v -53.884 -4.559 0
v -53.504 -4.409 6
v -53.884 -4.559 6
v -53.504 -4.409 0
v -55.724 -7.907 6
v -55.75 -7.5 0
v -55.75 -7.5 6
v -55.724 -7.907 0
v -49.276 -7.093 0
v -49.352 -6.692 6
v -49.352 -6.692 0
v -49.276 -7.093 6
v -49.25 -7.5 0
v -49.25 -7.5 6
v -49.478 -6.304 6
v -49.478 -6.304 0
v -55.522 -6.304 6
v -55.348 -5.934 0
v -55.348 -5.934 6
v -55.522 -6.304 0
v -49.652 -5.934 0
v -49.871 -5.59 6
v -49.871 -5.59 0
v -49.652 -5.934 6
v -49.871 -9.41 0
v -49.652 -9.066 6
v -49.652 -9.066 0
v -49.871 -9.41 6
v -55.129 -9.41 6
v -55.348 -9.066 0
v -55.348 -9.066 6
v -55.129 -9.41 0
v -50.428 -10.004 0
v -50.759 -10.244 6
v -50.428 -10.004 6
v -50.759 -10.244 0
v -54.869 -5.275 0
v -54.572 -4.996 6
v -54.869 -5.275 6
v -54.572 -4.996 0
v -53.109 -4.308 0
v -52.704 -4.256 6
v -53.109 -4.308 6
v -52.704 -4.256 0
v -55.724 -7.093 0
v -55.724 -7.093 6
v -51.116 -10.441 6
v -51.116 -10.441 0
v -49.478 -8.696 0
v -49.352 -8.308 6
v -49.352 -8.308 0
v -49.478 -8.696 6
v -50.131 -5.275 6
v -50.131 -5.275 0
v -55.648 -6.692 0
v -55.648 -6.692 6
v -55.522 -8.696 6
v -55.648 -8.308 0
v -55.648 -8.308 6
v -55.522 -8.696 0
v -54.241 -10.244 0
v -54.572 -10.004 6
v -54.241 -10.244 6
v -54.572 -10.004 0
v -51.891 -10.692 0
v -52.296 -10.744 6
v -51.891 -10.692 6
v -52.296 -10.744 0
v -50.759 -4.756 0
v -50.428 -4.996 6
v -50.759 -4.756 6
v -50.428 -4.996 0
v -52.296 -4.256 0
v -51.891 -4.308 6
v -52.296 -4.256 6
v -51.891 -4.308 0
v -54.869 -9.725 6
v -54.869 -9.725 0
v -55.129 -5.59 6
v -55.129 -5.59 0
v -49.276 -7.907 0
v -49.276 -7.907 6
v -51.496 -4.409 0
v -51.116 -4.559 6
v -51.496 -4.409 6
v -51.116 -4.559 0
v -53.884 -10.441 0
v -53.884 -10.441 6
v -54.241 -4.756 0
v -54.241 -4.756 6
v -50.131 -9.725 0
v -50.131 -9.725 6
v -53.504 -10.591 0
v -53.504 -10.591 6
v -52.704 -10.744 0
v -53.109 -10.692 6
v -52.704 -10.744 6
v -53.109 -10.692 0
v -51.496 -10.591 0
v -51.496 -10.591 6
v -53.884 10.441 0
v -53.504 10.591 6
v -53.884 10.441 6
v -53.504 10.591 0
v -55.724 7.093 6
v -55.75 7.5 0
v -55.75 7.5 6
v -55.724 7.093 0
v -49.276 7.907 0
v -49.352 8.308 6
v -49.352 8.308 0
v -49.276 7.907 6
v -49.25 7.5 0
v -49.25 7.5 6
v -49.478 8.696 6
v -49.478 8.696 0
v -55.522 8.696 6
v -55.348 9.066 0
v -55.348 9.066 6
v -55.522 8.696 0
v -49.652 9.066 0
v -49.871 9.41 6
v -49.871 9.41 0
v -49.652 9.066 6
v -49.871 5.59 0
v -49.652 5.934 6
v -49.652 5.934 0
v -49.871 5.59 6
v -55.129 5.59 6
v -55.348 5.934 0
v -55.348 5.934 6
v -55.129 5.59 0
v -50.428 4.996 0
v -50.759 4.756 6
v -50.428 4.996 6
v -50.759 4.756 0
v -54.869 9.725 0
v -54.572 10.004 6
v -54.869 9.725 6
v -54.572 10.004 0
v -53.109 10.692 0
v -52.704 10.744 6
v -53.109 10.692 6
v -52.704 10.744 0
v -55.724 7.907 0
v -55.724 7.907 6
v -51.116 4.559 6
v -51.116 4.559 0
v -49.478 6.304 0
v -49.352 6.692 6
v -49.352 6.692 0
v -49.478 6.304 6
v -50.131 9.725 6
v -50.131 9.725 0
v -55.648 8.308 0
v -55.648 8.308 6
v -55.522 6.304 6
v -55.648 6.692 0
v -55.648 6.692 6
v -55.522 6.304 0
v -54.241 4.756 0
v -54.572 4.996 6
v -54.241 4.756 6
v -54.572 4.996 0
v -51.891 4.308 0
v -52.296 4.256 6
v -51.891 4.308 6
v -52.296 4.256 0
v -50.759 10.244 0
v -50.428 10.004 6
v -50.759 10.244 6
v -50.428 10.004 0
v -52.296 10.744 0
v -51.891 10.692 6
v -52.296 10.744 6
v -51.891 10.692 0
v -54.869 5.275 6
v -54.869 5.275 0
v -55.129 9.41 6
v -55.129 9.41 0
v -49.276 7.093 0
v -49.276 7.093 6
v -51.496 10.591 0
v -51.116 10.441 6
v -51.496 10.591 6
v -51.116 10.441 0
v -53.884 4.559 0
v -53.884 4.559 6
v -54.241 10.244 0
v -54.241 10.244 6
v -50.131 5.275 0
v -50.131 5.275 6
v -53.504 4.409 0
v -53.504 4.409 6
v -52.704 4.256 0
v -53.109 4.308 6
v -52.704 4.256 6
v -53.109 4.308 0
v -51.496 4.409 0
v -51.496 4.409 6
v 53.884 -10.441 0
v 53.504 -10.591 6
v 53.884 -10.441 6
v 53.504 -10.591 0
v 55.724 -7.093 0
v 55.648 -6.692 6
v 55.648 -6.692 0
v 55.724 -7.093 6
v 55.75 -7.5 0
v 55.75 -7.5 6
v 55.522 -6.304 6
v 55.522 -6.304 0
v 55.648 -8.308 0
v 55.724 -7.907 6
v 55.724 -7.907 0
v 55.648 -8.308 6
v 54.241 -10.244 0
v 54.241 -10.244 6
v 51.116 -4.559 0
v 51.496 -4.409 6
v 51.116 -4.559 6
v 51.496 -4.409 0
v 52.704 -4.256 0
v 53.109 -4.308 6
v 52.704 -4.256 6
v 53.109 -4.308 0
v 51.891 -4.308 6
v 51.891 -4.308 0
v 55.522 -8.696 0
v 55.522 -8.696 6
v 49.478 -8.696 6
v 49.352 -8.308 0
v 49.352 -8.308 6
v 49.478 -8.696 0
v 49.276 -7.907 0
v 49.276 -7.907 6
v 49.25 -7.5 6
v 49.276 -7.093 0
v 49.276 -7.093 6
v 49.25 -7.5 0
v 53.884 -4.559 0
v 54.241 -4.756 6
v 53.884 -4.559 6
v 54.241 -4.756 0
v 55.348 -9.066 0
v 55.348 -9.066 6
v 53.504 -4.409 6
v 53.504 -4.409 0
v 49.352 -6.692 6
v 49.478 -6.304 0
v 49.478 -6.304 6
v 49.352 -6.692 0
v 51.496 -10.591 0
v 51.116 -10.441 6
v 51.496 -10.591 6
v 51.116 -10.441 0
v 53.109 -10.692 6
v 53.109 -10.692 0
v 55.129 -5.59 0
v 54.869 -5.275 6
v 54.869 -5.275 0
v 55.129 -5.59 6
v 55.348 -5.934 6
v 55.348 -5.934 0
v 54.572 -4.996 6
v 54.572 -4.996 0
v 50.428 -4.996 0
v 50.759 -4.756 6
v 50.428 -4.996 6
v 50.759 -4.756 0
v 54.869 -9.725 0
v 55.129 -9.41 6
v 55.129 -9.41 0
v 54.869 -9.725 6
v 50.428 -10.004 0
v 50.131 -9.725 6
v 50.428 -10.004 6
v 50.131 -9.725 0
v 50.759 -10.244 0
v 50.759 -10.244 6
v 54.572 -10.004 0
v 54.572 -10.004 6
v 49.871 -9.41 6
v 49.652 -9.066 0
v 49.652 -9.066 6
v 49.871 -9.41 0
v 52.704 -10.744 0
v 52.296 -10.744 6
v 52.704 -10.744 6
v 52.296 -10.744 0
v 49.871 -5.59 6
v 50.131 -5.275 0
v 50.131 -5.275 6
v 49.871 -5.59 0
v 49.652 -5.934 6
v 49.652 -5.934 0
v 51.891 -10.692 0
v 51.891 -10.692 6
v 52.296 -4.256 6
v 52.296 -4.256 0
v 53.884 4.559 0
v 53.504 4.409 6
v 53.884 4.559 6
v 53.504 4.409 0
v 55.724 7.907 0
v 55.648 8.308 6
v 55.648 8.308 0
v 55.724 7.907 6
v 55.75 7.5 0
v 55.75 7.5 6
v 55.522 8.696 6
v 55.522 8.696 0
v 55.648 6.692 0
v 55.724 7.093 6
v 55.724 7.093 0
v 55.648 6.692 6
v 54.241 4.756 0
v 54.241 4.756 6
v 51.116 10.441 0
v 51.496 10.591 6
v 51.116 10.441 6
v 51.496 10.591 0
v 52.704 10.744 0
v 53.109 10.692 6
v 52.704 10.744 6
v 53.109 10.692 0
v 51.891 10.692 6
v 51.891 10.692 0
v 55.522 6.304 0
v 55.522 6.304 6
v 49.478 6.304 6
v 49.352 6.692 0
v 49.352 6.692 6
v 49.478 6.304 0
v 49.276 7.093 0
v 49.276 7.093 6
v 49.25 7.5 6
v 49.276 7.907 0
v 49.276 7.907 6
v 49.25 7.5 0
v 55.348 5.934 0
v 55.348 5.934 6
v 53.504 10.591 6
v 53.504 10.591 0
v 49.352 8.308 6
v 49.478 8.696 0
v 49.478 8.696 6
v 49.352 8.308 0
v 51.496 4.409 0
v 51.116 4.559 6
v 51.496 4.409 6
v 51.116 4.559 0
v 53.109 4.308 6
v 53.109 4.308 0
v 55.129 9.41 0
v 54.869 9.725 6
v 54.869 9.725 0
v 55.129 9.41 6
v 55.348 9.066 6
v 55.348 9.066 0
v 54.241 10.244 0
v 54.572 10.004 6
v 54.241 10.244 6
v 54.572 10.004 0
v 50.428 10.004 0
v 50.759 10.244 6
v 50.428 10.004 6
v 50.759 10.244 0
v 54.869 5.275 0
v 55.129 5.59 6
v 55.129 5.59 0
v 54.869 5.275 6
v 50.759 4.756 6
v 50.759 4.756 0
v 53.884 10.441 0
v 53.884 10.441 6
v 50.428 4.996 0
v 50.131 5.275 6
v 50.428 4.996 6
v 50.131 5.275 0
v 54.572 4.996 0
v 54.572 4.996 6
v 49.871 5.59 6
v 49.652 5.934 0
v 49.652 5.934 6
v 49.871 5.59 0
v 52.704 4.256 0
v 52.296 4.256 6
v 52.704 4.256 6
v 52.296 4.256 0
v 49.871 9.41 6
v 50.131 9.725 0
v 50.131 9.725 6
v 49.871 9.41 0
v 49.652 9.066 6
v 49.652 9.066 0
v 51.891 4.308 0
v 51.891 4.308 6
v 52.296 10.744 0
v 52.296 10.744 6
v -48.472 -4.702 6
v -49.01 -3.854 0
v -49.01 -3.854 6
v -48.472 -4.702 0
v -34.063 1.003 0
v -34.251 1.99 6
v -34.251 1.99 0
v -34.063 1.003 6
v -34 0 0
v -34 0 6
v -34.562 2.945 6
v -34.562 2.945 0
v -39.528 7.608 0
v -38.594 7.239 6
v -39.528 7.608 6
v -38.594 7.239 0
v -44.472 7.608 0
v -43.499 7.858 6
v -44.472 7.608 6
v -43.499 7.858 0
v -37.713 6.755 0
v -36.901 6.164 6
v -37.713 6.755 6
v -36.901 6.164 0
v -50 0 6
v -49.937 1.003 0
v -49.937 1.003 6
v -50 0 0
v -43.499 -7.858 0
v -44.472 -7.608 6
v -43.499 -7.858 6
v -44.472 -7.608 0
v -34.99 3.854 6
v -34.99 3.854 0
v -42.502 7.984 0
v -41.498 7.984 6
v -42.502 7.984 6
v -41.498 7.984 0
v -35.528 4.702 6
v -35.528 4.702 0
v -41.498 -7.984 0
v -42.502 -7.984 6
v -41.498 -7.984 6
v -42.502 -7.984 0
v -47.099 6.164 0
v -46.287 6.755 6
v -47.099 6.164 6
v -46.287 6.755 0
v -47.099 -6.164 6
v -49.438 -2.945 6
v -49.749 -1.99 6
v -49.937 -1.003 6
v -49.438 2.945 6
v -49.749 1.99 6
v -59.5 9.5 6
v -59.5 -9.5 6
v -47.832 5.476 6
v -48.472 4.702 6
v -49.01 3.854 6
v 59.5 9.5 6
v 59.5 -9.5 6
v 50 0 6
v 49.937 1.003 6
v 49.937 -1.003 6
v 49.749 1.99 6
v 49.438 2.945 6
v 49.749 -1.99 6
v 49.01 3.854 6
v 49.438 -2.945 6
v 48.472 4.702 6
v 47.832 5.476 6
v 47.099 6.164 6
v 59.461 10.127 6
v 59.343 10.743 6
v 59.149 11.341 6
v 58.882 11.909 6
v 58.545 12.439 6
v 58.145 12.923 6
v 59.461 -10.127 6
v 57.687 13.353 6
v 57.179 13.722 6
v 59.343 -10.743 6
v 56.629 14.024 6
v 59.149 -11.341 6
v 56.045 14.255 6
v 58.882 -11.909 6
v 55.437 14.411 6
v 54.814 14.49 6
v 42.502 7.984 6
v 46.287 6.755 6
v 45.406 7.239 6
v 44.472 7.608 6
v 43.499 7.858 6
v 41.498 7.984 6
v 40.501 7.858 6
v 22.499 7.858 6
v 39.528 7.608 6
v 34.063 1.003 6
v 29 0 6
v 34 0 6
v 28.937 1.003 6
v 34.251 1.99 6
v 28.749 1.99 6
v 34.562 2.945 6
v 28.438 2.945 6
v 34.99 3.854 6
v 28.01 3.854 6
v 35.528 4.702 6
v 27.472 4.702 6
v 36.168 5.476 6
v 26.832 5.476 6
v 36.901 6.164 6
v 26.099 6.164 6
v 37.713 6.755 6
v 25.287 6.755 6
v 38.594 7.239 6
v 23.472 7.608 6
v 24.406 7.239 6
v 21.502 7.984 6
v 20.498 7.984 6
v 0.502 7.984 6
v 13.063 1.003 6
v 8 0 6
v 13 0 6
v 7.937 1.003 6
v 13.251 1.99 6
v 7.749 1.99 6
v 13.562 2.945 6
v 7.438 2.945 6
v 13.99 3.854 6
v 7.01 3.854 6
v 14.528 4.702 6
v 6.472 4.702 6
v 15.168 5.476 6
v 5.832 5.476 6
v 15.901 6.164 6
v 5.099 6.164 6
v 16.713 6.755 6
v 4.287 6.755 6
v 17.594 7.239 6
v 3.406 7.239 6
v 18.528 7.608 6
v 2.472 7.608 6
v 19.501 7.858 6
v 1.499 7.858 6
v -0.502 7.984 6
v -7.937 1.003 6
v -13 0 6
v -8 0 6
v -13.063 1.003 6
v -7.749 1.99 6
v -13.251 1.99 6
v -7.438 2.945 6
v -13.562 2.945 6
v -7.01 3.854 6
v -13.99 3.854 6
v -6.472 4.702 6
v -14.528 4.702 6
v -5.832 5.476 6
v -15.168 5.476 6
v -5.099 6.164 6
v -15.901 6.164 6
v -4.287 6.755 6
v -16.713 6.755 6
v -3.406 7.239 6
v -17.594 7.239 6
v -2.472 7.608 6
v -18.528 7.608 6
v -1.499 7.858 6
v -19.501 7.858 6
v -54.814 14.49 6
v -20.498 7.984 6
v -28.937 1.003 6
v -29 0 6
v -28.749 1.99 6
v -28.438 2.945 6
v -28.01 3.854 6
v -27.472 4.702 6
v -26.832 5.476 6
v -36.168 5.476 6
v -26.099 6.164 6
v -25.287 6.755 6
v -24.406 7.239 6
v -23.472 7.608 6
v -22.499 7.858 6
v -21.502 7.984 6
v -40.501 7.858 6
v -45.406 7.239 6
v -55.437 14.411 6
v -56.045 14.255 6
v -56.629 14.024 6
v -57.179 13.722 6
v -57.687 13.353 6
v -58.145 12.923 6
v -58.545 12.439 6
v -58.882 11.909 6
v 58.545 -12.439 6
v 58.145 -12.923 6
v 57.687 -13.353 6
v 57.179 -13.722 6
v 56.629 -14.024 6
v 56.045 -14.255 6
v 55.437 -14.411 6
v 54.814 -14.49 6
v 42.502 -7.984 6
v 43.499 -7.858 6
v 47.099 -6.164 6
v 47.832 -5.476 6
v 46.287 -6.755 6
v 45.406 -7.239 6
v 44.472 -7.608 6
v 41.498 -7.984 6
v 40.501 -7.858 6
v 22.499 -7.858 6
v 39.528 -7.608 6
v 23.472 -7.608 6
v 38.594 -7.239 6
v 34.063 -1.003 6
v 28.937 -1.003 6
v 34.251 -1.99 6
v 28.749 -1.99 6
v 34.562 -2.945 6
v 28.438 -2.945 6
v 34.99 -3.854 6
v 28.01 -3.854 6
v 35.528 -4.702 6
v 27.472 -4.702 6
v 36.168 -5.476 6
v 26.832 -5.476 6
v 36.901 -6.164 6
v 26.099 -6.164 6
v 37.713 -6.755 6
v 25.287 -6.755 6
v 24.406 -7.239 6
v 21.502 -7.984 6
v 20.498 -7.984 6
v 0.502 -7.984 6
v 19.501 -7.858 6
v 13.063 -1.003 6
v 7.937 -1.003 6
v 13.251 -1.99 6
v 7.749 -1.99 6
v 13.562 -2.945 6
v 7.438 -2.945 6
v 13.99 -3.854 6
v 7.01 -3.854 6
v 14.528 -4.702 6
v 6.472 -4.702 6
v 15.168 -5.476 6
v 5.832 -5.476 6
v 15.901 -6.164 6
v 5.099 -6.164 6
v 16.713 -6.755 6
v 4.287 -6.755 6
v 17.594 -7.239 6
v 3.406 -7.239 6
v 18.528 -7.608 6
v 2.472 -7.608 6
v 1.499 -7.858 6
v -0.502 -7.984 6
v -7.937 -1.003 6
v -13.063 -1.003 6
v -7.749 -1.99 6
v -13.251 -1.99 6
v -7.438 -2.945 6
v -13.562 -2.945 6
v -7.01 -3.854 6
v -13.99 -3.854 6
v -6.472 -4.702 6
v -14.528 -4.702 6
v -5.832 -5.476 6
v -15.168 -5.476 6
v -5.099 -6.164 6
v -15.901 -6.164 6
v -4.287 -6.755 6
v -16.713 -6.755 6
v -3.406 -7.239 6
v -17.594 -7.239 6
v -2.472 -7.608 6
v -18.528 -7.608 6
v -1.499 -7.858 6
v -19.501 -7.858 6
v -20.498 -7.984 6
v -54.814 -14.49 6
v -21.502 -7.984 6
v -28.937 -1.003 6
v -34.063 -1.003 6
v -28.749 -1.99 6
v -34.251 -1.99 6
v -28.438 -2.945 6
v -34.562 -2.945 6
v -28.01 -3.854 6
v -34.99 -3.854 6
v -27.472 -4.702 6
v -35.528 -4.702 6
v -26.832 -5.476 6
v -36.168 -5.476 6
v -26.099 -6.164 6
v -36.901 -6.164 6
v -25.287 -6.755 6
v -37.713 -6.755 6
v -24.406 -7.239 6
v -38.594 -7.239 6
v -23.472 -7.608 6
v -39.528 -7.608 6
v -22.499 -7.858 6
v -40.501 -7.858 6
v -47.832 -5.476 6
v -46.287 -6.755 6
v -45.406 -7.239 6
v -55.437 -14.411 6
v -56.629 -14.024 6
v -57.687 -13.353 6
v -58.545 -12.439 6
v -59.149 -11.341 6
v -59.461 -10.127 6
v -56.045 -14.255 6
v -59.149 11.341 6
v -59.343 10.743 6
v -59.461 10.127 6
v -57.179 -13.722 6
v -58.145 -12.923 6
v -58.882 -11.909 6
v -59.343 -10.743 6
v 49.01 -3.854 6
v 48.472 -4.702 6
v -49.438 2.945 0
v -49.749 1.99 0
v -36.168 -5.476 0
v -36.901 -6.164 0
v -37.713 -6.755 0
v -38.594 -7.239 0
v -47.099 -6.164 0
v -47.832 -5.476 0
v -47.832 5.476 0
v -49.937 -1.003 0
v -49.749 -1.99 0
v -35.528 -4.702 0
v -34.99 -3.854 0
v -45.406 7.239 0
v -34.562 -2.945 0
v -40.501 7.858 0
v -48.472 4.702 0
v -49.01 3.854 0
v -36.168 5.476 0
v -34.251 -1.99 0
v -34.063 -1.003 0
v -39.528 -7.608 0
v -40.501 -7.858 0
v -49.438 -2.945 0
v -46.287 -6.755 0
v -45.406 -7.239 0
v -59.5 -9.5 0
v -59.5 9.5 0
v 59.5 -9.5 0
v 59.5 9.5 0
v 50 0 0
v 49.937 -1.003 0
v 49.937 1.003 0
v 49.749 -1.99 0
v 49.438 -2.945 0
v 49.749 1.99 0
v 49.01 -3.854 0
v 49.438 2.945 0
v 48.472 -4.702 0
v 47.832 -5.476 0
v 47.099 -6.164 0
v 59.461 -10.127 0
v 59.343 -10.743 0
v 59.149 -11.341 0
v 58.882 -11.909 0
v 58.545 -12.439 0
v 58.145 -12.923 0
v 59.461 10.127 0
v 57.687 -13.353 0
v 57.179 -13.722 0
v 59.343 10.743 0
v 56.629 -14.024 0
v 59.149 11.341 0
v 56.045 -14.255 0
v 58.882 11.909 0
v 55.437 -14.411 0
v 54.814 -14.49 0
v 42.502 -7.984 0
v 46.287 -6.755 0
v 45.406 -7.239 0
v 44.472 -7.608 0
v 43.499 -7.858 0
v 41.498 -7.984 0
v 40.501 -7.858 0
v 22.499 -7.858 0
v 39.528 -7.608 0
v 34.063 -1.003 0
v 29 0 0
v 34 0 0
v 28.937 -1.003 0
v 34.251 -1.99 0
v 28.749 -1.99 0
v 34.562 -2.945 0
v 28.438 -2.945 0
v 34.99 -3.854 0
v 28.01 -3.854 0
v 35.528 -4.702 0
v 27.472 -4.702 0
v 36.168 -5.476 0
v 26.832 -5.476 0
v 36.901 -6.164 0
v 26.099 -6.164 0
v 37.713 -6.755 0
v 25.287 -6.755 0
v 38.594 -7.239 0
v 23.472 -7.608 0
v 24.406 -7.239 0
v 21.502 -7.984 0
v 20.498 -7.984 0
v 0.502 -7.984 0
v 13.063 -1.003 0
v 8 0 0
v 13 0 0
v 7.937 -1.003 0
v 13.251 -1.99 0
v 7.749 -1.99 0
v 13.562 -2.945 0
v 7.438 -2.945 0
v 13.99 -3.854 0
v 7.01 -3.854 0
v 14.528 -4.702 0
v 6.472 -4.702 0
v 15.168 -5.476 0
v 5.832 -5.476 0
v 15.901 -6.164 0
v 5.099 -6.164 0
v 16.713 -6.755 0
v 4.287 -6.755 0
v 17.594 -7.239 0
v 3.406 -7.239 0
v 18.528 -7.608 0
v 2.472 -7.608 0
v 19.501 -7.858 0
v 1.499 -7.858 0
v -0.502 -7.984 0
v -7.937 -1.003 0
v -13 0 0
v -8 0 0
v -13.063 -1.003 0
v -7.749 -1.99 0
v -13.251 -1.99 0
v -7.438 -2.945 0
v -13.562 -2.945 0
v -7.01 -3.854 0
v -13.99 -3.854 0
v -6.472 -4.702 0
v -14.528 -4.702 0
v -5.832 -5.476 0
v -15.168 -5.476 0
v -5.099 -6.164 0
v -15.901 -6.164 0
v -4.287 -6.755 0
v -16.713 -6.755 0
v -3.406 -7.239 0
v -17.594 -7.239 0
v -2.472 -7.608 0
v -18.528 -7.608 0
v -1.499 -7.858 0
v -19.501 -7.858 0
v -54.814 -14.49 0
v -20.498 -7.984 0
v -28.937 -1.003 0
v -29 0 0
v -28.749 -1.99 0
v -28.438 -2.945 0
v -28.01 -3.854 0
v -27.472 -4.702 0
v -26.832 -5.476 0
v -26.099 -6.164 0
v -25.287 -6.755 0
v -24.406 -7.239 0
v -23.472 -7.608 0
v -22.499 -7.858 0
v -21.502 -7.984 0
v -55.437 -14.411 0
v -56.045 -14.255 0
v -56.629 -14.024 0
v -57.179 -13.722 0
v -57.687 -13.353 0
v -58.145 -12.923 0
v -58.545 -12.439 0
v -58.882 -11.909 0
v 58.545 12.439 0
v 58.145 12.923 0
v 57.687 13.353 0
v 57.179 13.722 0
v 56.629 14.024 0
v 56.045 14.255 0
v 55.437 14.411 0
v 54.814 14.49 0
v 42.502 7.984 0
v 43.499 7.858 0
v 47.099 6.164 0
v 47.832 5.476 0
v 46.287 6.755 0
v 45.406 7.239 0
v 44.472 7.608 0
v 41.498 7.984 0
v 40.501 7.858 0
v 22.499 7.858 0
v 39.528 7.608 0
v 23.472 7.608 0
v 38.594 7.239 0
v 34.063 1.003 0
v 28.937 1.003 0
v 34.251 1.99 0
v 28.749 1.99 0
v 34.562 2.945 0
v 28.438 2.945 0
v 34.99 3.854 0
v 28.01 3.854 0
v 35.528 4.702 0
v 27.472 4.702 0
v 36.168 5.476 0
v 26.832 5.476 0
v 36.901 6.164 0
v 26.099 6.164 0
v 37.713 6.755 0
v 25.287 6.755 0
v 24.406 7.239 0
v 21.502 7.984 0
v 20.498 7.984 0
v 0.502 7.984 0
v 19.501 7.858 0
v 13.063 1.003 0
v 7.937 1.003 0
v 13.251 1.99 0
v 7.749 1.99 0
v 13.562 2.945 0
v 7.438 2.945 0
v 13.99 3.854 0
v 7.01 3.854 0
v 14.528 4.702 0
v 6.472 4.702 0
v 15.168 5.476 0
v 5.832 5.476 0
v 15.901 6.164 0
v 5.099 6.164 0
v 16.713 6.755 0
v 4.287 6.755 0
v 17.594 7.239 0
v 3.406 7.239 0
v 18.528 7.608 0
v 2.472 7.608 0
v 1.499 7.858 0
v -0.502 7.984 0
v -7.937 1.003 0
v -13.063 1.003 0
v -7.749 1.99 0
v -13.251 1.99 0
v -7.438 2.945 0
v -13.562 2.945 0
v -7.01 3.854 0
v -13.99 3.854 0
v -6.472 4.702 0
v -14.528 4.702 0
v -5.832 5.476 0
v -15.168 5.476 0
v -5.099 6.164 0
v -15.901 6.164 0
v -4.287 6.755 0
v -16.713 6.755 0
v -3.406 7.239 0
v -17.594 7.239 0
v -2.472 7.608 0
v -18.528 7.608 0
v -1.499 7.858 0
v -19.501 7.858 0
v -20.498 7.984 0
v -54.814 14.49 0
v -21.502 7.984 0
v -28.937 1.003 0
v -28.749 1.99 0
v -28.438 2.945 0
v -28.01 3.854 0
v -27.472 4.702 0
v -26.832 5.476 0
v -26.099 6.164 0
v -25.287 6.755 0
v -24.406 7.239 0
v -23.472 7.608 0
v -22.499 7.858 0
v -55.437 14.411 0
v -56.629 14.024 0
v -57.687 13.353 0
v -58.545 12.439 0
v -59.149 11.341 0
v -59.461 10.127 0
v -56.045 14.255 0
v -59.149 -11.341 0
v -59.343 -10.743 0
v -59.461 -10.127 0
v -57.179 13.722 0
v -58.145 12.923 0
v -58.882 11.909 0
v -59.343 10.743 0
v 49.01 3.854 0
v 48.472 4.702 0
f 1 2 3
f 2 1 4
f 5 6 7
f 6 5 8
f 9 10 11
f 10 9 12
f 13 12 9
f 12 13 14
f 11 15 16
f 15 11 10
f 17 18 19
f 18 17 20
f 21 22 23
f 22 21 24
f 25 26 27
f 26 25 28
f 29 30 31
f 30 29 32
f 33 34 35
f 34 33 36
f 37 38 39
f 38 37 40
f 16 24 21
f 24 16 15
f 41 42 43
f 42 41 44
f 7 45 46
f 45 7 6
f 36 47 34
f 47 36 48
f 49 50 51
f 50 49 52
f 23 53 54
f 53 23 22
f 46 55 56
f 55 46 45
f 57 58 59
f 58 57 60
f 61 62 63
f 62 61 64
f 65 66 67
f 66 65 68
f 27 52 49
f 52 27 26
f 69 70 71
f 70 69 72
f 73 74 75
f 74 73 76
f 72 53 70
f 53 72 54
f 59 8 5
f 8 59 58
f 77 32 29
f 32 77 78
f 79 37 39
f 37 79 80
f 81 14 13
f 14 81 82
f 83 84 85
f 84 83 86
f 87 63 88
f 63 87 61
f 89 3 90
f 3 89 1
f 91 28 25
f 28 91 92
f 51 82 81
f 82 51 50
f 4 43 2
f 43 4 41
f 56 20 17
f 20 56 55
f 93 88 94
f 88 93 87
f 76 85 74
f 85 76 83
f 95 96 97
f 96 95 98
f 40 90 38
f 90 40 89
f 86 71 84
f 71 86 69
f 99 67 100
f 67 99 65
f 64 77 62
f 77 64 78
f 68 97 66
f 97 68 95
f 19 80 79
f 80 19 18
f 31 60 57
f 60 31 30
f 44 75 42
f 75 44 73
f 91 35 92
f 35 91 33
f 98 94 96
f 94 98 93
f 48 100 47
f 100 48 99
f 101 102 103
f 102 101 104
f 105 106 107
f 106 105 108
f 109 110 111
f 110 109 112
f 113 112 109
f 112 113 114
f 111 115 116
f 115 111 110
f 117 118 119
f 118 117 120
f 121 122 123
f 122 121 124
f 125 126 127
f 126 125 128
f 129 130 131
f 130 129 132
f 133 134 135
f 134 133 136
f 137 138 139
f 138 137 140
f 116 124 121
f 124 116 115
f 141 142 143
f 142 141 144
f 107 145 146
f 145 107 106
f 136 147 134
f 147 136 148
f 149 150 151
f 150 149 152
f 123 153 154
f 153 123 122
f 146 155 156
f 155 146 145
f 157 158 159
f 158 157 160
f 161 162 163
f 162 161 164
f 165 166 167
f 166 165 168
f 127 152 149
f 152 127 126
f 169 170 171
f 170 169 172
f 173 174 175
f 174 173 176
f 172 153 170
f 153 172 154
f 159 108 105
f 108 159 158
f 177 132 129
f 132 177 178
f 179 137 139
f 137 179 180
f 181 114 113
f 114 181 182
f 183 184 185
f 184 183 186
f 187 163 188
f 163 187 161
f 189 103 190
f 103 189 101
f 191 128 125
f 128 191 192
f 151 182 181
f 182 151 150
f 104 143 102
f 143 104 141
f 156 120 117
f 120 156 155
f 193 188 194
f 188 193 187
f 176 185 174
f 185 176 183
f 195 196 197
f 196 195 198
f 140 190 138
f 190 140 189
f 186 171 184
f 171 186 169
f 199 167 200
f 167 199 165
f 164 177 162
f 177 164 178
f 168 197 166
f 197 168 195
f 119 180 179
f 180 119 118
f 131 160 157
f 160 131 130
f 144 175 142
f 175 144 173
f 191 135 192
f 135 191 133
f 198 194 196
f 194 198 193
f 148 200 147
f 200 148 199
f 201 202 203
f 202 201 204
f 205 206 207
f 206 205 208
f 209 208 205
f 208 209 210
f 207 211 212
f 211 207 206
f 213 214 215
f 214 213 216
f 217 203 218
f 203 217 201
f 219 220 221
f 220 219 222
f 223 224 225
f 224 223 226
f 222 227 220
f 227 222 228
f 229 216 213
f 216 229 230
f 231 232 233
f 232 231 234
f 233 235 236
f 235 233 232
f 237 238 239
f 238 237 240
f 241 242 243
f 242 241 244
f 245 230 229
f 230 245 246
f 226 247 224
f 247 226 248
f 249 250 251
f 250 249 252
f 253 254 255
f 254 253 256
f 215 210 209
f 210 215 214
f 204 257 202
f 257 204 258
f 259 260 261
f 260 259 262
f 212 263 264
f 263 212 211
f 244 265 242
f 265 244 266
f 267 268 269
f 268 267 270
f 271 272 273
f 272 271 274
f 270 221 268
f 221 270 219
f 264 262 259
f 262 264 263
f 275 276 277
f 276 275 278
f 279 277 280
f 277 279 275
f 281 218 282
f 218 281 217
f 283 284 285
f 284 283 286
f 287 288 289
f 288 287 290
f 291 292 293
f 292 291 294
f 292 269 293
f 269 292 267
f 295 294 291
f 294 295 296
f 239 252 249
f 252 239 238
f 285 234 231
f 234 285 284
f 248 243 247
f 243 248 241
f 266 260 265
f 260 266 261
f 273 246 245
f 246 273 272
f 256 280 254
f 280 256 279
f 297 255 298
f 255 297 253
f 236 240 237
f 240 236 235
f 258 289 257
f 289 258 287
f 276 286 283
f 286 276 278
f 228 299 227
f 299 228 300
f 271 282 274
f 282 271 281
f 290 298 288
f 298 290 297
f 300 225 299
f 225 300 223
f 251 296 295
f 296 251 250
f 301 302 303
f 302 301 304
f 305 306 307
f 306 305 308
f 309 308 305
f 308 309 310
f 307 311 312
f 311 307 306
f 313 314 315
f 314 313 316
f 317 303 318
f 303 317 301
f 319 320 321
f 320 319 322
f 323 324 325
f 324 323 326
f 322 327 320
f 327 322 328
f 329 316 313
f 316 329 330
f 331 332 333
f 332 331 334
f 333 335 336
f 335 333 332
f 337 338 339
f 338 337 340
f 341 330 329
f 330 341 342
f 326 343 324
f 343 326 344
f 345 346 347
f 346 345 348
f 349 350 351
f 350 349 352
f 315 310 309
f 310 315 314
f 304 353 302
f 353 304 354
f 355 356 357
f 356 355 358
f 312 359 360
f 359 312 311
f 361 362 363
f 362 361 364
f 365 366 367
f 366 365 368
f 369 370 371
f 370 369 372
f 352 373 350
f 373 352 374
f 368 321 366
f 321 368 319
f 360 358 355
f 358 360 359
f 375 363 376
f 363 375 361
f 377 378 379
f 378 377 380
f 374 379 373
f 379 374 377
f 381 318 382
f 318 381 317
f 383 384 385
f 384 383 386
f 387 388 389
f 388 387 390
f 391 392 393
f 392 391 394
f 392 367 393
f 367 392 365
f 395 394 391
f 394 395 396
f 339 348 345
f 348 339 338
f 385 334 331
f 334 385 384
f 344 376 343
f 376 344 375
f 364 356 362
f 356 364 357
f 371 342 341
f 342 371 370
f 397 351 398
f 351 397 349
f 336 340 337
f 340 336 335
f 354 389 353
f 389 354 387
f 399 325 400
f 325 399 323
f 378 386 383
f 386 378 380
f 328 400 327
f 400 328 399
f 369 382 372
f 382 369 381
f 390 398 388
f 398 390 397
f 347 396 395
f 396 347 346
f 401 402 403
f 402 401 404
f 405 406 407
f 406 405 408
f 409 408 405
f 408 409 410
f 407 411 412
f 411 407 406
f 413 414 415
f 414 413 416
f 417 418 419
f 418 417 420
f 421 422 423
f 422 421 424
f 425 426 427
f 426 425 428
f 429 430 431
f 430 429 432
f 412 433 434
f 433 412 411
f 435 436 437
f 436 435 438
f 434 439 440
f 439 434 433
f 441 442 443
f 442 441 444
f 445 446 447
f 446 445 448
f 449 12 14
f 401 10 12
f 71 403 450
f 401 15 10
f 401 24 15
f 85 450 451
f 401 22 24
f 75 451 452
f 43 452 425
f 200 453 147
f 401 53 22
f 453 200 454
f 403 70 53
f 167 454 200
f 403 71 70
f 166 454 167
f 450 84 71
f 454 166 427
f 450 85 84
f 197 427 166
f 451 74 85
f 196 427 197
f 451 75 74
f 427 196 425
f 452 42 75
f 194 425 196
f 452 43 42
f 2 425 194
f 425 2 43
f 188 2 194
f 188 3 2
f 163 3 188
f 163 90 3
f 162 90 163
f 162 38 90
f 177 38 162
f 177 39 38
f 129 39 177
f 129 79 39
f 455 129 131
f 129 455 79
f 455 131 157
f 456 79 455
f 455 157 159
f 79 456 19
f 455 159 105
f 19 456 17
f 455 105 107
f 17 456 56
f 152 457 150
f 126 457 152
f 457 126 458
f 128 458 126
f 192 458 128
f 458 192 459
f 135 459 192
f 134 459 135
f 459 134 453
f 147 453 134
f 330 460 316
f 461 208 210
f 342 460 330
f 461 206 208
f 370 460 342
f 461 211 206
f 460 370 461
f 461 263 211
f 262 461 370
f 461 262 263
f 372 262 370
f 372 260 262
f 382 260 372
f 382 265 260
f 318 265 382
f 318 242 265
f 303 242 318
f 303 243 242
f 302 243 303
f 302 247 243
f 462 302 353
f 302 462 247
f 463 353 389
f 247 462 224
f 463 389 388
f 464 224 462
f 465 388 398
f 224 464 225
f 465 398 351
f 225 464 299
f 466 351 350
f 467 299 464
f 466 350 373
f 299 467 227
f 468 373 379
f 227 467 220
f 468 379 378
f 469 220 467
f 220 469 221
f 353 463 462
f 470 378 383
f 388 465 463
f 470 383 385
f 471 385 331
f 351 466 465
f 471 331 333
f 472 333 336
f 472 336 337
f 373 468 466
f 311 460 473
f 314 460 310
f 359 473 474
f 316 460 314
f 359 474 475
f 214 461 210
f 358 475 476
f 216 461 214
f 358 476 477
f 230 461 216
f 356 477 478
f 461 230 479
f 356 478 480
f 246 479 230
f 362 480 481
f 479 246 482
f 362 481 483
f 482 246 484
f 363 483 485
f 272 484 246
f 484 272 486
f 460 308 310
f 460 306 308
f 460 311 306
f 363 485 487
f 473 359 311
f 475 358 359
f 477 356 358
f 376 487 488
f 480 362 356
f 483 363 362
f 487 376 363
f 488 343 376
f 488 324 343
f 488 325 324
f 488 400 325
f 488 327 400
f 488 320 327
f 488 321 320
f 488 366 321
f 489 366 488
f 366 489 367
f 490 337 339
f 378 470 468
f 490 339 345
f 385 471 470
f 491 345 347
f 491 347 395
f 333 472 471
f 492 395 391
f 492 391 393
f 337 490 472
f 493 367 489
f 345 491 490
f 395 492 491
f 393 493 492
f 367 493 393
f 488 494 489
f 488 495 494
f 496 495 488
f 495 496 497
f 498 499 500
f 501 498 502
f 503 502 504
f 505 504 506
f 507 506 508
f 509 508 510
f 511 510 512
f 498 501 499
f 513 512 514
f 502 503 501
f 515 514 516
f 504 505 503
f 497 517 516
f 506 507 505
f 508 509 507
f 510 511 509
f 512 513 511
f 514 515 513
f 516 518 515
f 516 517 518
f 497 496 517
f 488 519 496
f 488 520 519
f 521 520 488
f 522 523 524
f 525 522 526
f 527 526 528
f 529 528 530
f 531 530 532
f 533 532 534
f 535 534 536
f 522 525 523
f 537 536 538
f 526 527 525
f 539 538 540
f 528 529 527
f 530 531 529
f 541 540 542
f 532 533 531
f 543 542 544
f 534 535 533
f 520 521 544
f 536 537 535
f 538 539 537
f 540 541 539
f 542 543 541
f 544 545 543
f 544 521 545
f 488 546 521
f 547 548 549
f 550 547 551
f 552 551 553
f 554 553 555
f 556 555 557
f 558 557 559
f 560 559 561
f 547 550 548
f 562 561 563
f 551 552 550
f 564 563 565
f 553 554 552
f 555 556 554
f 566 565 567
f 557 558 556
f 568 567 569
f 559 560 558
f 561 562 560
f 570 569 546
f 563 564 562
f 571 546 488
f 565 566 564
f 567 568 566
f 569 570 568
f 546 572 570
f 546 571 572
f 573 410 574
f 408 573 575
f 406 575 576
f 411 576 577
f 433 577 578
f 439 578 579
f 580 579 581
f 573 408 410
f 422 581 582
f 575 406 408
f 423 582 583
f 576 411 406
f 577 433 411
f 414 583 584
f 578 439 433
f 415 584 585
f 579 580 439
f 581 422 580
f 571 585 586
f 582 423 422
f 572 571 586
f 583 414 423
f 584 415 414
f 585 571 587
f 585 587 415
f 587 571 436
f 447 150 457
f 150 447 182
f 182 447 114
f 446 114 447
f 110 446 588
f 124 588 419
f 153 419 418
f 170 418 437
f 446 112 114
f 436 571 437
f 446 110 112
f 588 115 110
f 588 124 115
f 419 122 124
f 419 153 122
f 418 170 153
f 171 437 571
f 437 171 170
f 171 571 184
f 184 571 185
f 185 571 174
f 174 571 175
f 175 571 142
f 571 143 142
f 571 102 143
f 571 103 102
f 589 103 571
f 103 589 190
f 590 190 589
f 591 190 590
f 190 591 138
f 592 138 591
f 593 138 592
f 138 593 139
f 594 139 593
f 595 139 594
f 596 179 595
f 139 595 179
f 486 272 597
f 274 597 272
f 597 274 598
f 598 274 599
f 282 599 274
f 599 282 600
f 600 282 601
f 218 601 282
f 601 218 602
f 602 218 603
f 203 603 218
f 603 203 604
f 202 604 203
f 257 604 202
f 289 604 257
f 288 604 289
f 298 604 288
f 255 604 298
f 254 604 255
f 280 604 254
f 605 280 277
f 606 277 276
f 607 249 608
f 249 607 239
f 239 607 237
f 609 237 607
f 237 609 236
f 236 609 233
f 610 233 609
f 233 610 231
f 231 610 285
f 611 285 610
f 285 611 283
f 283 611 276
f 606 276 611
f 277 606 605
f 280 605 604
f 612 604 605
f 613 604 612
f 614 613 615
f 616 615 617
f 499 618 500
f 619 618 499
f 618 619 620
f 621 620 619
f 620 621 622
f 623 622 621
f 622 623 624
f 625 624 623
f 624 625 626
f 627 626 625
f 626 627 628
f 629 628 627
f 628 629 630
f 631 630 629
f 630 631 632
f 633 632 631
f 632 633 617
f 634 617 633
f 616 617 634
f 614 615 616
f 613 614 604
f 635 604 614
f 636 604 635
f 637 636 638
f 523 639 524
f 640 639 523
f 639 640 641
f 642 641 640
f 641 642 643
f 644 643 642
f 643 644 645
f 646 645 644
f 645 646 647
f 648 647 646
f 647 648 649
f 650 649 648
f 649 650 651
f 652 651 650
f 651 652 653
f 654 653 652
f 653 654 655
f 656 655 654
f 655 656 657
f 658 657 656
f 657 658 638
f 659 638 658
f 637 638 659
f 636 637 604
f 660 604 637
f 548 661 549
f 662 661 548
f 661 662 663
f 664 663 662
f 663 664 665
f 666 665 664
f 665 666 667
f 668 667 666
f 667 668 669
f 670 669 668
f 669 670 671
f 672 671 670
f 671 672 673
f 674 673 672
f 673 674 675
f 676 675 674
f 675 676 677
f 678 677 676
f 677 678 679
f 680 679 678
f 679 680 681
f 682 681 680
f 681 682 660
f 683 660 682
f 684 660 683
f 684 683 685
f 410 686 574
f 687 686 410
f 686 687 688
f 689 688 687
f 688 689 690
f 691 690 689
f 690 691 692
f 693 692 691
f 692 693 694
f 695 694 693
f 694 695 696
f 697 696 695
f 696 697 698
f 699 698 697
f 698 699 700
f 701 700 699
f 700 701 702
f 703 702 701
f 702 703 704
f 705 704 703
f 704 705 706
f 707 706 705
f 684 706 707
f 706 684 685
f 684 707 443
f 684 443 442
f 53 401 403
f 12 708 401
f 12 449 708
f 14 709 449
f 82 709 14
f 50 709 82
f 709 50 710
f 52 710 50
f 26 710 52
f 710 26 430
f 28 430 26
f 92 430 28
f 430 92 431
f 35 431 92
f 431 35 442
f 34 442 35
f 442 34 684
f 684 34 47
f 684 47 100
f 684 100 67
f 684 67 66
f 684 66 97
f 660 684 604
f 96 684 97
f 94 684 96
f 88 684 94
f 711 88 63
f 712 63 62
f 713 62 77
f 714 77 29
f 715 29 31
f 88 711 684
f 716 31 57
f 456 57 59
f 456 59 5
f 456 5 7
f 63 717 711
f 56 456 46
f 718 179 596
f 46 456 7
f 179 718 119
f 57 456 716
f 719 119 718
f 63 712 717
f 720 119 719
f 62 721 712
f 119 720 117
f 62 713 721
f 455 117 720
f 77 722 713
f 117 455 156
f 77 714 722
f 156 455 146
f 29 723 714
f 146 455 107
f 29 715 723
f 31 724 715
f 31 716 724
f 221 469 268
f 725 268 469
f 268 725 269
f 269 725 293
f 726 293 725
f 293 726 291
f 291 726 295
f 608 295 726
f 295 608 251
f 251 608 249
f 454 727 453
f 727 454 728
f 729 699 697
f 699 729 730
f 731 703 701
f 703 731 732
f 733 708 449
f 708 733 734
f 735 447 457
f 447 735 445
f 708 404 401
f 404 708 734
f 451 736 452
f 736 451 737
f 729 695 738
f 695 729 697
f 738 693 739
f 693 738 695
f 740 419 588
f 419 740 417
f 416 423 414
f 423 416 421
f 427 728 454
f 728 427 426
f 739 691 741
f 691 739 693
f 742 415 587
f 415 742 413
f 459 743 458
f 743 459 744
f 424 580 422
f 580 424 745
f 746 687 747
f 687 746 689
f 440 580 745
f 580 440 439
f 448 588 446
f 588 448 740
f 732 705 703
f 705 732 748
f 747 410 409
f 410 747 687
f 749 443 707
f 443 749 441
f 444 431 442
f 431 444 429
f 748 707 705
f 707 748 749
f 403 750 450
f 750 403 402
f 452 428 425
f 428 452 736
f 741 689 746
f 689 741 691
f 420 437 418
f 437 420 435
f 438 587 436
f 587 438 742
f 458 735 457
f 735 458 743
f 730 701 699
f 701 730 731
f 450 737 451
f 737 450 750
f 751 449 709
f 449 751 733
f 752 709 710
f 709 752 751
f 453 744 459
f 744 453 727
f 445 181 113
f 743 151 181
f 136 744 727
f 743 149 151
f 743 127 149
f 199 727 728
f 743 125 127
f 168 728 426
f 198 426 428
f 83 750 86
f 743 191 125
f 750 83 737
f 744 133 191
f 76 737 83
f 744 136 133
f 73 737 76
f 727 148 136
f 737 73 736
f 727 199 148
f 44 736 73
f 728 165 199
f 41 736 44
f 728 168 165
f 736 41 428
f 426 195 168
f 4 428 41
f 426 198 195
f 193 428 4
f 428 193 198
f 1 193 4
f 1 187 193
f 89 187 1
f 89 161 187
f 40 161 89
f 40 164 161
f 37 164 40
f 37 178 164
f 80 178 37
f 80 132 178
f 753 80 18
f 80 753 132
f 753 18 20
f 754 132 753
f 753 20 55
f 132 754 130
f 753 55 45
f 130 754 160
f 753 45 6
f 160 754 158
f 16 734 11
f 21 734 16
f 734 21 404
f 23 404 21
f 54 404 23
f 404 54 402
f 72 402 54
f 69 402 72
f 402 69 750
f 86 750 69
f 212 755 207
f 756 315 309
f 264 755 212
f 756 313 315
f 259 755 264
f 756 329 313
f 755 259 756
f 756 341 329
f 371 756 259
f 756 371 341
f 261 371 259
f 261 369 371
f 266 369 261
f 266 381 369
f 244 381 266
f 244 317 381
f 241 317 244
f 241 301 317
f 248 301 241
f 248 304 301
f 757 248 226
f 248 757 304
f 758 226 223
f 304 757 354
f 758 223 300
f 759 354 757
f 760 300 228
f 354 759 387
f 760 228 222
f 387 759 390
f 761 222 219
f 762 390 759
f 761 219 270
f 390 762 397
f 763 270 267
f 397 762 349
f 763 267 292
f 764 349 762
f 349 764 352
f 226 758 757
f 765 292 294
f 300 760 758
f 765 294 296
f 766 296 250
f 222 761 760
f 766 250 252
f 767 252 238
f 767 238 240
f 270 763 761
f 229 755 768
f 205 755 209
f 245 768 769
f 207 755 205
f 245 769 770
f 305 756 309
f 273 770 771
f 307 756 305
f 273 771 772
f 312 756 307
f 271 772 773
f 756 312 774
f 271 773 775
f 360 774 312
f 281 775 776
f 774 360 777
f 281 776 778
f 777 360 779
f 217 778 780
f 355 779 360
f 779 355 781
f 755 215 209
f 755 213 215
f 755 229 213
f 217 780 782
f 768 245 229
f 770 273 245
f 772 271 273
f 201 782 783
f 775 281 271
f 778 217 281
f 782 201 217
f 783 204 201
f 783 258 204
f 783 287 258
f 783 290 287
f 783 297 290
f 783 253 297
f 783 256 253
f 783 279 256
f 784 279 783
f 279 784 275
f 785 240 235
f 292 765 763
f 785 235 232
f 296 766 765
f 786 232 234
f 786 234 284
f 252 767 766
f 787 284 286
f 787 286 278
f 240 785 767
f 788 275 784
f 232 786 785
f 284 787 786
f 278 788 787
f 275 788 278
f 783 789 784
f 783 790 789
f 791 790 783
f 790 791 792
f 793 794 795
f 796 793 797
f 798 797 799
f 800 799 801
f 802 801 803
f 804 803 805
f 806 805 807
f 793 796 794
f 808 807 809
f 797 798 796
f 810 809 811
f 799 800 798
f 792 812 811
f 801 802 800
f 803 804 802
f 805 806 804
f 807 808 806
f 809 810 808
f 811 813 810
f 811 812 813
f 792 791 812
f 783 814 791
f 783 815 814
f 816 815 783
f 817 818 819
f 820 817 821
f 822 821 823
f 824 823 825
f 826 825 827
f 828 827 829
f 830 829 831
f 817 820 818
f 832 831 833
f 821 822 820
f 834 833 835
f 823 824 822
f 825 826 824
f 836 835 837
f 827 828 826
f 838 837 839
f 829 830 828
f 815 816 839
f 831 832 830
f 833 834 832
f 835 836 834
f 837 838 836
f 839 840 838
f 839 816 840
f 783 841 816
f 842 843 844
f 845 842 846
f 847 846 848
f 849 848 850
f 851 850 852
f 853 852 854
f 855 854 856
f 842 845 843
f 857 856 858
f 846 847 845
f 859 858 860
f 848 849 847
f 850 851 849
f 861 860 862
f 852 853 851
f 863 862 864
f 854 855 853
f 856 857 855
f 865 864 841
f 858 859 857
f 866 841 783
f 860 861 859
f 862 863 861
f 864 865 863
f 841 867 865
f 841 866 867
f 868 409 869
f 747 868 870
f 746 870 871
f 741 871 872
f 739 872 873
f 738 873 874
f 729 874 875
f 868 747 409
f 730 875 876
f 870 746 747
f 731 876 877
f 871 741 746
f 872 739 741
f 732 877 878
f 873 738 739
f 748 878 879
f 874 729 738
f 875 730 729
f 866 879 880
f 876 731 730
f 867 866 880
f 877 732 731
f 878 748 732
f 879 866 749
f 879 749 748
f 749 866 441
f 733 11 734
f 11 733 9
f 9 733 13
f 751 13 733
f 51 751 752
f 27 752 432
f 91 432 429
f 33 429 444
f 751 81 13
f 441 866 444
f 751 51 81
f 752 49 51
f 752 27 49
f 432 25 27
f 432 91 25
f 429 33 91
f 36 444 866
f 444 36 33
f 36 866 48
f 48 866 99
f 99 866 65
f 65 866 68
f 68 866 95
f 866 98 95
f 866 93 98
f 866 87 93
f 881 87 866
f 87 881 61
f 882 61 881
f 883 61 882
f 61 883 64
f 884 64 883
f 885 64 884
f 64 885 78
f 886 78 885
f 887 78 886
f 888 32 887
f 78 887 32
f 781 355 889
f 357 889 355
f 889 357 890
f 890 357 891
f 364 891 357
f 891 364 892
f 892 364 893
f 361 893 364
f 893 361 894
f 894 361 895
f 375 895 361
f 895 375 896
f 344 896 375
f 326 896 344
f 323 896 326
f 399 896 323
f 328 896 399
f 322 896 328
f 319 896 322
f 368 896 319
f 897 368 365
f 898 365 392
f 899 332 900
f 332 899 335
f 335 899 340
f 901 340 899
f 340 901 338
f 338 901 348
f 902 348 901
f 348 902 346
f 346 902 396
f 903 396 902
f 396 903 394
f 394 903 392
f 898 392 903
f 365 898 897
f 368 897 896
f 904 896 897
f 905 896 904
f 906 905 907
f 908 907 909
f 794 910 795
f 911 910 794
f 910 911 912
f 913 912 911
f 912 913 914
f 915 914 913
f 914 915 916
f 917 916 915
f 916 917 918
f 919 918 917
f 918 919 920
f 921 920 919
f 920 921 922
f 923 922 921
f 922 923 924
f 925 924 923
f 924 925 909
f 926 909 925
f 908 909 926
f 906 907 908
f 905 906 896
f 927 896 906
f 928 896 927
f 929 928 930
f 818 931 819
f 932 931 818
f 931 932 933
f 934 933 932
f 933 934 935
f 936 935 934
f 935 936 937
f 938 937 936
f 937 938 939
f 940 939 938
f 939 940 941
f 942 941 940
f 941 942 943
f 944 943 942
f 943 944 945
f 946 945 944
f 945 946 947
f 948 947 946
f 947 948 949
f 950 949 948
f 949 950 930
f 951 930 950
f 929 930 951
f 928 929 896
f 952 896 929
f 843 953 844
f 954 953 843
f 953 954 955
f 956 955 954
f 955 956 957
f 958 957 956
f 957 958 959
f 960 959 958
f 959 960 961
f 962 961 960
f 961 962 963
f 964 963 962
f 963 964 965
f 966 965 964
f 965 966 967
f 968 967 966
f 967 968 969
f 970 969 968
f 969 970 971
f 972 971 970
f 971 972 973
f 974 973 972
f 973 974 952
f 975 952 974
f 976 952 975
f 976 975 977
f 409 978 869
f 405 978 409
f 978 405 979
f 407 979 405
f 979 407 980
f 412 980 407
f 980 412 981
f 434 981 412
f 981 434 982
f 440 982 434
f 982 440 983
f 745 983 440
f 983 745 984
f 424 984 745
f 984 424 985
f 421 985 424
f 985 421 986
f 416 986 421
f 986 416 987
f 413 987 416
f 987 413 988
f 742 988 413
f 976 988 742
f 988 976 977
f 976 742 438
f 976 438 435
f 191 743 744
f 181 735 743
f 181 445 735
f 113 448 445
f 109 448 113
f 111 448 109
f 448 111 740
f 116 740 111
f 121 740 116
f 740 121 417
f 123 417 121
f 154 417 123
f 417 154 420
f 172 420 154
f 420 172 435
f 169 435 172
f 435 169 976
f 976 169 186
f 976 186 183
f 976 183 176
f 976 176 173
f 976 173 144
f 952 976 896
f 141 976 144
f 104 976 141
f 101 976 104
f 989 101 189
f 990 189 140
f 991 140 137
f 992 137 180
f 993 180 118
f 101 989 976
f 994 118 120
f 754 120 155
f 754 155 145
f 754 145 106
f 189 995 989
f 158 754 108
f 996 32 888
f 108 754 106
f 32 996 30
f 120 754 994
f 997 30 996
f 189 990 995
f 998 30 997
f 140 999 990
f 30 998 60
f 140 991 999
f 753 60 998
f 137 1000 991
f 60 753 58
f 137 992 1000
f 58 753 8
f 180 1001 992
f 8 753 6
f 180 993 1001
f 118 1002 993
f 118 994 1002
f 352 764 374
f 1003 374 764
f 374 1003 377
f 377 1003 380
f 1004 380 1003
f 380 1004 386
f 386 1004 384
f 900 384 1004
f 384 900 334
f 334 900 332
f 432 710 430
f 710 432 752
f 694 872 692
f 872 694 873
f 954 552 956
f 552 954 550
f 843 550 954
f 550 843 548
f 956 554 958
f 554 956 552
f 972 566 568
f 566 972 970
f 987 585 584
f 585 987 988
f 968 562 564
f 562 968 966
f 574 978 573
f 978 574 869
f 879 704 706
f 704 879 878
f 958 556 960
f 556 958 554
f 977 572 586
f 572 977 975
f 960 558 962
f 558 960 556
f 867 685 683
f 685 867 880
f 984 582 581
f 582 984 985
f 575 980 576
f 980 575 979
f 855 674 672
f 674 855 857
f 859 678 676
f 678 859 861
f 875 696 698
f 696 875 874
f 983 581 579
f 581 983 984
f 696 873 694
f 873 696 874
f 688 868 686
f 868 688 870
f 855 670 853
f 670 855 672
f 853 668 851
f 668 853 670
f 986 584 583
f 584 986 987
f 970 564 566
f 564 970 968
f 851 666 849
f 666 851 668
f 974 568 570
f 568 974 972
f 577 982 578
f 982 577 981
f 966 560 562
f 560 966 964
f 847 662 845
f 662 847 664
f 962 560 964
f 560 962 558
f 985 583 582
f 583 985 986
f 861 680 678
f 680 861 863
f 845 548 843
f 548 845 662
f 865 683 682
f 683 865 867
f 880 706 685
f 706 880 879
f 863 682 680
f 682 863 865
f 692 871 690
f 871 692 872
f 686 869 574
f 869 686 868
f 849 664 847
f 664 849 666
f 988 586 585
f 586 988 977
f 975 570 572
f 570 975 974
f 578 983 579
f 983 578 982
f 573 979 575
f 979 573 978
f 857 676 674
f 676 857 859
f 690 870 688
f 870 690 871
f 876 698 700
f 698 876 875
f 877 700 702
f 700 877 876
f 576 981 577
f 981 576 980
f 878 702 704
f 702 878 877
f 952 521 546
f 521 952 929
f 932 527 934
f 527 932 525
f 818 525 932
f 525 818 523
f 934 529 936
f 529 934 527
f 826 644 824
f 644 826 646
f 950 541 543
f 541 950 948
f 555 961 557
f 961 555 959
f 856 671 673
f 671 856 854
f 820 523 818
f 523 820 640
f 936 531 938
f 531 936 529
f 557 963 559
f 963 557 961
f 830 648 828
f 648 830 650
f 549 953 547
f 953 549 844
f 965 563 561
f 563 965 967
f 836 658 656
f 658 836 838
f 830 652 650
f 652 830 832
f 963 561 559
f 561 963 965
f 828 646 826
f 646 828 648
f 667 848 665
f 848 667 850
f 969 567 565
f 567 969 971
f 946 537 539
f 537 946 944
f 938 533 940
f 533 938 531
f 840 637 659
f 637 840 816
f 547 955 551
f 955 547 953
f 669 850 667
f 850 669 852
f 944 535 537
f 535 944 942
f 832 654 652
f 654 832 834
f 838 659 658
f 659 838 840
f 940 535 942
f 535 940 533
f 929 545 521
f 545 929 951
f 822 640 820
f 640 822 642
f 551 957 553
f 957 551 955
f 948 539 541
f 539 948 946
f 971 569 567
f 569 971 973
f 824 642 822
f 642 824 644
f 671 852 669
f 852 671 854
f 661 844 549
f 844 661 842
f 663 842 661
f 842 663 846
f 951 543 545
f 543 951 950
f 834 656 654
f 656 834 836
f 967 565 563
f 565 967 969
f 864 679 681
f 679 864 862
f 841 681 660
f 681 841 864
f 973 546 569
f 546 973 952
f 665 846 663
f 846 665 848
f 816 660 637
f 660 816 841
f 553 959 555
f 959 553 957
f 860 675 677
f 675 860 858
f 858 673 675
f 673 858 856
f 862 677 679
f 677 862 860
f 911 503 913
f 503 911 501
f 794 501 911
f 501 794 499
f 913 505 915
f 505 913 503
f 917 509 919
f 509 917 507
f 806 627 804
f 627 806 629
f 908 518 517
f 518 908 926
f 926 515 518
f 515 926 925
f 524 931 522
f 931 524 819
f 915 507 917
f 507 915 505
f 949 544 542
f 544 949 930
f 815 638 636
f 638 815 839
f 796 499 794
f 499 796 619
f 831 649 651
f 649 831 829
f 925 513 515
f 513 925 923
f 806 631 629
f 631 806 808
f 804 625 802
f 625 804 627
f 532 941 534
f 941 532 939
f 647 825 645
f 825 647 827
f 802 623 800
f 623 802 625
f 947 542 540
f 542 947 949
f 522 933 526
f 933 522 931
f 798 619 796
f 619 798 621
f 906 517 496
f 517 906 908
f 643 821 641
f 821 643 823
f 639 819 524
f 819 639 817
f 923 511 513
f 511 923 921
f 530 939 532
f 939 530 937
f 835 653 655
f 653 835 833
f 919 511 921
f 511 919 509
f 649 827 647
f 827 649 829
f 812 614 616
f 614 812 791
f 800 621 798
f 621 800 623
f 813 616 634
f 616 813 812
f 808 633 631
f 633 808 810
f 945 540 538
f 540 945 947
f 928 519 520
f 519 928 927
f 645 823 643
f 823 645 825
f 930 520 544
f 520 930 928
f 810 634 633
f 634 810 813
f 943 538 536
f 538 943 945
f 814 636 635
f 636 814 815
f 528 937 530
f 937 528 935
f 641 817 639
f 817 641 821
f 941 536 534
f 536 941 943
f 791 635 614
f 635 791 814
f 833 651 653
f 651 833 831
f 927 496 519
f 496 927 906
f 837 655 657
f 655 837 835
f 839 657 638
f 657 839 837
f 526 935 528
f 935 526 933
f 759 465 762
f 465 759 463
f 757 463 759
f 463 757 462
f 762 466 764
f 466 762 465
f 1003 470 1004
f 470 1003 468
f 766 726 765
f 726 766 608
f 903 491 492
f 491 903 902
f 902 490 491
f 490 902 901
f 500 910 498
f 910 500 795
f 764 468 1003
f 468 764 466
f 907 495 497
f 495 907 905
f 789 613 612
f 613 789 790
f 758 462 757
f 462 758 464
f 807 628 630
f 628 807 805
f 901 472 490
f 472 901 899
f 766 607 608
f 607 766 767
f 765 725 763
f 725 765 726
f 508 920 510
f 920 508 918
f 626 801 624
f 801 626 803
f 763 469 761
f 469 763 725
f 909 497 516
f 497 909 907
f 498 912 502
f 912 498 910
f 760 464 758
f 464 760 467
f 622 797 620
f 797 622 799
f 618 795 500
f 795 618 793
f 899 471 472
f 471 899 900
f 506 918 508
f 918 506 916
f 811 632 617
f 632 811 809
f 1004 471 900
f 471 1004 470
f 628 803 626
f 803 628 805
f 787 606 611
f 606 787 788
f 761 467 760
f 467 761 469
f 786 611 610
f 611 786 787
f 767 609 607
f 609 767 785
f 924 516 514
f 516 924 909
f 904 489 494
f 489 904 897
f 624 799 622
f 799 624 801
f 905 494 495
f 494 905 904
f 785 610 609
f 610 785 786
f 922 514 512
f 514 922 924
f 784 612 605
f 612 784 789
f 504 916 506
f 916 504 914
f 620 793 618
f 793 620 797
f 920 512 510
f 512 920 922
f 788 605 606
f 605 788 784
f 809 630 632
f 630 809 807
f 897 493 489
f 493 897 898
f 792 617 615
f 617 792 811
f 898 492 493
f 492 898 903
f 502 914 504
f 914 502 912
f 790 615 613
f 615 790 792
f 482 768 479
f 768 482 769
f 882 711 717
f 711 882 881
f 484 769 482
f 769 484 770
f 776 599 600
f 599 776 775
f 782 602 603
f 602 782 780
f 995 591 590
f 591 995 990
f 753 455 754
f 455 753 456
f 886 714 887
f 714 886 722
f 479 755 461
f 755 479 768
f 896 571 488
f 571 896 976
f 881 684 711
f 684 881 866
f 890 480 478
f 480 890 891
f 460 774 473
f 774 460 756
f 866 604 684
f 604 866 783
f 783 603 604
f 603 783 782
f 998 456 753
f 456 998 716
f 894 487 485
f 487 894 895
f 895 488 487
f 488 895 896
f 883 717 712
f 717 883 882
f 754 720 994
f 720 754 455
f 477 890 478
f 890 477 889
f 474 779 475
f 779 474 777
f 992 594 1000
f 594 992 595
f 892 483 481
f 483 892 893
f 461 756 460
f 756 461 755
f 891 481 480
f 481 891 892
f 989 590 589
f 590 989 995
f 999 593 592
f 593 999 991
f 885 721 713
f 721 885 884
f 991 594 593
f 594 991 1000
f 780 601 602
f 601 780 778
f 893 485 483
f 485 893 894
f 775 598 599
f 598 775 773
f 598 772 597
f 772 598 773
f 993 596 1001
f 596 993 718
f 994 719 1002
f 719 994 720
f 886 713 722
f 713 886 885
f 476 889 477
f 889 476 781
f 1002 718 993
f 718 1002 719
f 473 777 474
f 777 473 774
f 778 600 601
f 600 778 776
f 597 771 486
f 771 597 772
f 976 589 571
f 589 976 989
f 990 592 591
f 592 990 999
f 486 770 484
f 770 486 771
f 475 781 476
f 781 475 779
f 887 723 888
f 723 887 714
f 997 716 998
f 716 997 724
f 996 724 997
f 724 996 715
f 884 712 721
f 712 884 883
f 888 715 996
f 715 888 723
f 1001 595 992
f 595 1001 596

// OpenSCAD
$fn = 50;


difference() {
	union() {
		hull() {
			translate(v = [-54.5000000000, 9.5000000000, 0]) {
				cylinder(h = 6, r = 5);
			}
			translate(v = [54.5000000000, 9.5000000000, 0]) {
				cylinder(h = 6, r = 5);
			}
			translate(v = [-54.5000000000, -9.5000000000, 0]) {
				cylinder(h = 6, r = 5);
			}
			translate(v = [54.5000000000, -9.5000000000, 0]) {
				cylinder(h = 6, r = 5);
			}
		}
	}
	union() {
		#translate(v = [-52.5000000000, -7.5000000000, -100.0000000000]) {
			cylinder(h = 200, r = 3.2500000000);
		}
		#translate(v = [-52.5000000000, 7.5000000000, -100.0000000000]) {
			cylinder(h = 200, r = 3.2500000000);
		}
		#translate(v = [52.5000000000, -7.5000000000, -100.0000000000]) {
			cylinder(h = 200, r = 3.2500000000);
		}
		#translate(v = [52.5000000000, 7.5000000000, -100.0000000000]) {
			cylinder(h = 200, r = 3.2500000000);
		}
		#translate(v = [-42.0000000000, 0, 0]) {
			cylinder(h = 6, r = 8.0000000000);
		}
		#translate(v = [-21.0000000000, 0, 0]) {
			cylinder(h = 6, r = 8.0000000000);
		}
		#cylinder(h = 6, r = 8.0000000000);
		#translate(v = [21.0000000000, 0, 0]) {
			cylinder(h = 6, r = 8.0000000000);
		}
		#translate(v = [42.0000000000, 0, 0]) {
			cylinder(h = 6, r = 8.0000000000);
		}
	}
}
